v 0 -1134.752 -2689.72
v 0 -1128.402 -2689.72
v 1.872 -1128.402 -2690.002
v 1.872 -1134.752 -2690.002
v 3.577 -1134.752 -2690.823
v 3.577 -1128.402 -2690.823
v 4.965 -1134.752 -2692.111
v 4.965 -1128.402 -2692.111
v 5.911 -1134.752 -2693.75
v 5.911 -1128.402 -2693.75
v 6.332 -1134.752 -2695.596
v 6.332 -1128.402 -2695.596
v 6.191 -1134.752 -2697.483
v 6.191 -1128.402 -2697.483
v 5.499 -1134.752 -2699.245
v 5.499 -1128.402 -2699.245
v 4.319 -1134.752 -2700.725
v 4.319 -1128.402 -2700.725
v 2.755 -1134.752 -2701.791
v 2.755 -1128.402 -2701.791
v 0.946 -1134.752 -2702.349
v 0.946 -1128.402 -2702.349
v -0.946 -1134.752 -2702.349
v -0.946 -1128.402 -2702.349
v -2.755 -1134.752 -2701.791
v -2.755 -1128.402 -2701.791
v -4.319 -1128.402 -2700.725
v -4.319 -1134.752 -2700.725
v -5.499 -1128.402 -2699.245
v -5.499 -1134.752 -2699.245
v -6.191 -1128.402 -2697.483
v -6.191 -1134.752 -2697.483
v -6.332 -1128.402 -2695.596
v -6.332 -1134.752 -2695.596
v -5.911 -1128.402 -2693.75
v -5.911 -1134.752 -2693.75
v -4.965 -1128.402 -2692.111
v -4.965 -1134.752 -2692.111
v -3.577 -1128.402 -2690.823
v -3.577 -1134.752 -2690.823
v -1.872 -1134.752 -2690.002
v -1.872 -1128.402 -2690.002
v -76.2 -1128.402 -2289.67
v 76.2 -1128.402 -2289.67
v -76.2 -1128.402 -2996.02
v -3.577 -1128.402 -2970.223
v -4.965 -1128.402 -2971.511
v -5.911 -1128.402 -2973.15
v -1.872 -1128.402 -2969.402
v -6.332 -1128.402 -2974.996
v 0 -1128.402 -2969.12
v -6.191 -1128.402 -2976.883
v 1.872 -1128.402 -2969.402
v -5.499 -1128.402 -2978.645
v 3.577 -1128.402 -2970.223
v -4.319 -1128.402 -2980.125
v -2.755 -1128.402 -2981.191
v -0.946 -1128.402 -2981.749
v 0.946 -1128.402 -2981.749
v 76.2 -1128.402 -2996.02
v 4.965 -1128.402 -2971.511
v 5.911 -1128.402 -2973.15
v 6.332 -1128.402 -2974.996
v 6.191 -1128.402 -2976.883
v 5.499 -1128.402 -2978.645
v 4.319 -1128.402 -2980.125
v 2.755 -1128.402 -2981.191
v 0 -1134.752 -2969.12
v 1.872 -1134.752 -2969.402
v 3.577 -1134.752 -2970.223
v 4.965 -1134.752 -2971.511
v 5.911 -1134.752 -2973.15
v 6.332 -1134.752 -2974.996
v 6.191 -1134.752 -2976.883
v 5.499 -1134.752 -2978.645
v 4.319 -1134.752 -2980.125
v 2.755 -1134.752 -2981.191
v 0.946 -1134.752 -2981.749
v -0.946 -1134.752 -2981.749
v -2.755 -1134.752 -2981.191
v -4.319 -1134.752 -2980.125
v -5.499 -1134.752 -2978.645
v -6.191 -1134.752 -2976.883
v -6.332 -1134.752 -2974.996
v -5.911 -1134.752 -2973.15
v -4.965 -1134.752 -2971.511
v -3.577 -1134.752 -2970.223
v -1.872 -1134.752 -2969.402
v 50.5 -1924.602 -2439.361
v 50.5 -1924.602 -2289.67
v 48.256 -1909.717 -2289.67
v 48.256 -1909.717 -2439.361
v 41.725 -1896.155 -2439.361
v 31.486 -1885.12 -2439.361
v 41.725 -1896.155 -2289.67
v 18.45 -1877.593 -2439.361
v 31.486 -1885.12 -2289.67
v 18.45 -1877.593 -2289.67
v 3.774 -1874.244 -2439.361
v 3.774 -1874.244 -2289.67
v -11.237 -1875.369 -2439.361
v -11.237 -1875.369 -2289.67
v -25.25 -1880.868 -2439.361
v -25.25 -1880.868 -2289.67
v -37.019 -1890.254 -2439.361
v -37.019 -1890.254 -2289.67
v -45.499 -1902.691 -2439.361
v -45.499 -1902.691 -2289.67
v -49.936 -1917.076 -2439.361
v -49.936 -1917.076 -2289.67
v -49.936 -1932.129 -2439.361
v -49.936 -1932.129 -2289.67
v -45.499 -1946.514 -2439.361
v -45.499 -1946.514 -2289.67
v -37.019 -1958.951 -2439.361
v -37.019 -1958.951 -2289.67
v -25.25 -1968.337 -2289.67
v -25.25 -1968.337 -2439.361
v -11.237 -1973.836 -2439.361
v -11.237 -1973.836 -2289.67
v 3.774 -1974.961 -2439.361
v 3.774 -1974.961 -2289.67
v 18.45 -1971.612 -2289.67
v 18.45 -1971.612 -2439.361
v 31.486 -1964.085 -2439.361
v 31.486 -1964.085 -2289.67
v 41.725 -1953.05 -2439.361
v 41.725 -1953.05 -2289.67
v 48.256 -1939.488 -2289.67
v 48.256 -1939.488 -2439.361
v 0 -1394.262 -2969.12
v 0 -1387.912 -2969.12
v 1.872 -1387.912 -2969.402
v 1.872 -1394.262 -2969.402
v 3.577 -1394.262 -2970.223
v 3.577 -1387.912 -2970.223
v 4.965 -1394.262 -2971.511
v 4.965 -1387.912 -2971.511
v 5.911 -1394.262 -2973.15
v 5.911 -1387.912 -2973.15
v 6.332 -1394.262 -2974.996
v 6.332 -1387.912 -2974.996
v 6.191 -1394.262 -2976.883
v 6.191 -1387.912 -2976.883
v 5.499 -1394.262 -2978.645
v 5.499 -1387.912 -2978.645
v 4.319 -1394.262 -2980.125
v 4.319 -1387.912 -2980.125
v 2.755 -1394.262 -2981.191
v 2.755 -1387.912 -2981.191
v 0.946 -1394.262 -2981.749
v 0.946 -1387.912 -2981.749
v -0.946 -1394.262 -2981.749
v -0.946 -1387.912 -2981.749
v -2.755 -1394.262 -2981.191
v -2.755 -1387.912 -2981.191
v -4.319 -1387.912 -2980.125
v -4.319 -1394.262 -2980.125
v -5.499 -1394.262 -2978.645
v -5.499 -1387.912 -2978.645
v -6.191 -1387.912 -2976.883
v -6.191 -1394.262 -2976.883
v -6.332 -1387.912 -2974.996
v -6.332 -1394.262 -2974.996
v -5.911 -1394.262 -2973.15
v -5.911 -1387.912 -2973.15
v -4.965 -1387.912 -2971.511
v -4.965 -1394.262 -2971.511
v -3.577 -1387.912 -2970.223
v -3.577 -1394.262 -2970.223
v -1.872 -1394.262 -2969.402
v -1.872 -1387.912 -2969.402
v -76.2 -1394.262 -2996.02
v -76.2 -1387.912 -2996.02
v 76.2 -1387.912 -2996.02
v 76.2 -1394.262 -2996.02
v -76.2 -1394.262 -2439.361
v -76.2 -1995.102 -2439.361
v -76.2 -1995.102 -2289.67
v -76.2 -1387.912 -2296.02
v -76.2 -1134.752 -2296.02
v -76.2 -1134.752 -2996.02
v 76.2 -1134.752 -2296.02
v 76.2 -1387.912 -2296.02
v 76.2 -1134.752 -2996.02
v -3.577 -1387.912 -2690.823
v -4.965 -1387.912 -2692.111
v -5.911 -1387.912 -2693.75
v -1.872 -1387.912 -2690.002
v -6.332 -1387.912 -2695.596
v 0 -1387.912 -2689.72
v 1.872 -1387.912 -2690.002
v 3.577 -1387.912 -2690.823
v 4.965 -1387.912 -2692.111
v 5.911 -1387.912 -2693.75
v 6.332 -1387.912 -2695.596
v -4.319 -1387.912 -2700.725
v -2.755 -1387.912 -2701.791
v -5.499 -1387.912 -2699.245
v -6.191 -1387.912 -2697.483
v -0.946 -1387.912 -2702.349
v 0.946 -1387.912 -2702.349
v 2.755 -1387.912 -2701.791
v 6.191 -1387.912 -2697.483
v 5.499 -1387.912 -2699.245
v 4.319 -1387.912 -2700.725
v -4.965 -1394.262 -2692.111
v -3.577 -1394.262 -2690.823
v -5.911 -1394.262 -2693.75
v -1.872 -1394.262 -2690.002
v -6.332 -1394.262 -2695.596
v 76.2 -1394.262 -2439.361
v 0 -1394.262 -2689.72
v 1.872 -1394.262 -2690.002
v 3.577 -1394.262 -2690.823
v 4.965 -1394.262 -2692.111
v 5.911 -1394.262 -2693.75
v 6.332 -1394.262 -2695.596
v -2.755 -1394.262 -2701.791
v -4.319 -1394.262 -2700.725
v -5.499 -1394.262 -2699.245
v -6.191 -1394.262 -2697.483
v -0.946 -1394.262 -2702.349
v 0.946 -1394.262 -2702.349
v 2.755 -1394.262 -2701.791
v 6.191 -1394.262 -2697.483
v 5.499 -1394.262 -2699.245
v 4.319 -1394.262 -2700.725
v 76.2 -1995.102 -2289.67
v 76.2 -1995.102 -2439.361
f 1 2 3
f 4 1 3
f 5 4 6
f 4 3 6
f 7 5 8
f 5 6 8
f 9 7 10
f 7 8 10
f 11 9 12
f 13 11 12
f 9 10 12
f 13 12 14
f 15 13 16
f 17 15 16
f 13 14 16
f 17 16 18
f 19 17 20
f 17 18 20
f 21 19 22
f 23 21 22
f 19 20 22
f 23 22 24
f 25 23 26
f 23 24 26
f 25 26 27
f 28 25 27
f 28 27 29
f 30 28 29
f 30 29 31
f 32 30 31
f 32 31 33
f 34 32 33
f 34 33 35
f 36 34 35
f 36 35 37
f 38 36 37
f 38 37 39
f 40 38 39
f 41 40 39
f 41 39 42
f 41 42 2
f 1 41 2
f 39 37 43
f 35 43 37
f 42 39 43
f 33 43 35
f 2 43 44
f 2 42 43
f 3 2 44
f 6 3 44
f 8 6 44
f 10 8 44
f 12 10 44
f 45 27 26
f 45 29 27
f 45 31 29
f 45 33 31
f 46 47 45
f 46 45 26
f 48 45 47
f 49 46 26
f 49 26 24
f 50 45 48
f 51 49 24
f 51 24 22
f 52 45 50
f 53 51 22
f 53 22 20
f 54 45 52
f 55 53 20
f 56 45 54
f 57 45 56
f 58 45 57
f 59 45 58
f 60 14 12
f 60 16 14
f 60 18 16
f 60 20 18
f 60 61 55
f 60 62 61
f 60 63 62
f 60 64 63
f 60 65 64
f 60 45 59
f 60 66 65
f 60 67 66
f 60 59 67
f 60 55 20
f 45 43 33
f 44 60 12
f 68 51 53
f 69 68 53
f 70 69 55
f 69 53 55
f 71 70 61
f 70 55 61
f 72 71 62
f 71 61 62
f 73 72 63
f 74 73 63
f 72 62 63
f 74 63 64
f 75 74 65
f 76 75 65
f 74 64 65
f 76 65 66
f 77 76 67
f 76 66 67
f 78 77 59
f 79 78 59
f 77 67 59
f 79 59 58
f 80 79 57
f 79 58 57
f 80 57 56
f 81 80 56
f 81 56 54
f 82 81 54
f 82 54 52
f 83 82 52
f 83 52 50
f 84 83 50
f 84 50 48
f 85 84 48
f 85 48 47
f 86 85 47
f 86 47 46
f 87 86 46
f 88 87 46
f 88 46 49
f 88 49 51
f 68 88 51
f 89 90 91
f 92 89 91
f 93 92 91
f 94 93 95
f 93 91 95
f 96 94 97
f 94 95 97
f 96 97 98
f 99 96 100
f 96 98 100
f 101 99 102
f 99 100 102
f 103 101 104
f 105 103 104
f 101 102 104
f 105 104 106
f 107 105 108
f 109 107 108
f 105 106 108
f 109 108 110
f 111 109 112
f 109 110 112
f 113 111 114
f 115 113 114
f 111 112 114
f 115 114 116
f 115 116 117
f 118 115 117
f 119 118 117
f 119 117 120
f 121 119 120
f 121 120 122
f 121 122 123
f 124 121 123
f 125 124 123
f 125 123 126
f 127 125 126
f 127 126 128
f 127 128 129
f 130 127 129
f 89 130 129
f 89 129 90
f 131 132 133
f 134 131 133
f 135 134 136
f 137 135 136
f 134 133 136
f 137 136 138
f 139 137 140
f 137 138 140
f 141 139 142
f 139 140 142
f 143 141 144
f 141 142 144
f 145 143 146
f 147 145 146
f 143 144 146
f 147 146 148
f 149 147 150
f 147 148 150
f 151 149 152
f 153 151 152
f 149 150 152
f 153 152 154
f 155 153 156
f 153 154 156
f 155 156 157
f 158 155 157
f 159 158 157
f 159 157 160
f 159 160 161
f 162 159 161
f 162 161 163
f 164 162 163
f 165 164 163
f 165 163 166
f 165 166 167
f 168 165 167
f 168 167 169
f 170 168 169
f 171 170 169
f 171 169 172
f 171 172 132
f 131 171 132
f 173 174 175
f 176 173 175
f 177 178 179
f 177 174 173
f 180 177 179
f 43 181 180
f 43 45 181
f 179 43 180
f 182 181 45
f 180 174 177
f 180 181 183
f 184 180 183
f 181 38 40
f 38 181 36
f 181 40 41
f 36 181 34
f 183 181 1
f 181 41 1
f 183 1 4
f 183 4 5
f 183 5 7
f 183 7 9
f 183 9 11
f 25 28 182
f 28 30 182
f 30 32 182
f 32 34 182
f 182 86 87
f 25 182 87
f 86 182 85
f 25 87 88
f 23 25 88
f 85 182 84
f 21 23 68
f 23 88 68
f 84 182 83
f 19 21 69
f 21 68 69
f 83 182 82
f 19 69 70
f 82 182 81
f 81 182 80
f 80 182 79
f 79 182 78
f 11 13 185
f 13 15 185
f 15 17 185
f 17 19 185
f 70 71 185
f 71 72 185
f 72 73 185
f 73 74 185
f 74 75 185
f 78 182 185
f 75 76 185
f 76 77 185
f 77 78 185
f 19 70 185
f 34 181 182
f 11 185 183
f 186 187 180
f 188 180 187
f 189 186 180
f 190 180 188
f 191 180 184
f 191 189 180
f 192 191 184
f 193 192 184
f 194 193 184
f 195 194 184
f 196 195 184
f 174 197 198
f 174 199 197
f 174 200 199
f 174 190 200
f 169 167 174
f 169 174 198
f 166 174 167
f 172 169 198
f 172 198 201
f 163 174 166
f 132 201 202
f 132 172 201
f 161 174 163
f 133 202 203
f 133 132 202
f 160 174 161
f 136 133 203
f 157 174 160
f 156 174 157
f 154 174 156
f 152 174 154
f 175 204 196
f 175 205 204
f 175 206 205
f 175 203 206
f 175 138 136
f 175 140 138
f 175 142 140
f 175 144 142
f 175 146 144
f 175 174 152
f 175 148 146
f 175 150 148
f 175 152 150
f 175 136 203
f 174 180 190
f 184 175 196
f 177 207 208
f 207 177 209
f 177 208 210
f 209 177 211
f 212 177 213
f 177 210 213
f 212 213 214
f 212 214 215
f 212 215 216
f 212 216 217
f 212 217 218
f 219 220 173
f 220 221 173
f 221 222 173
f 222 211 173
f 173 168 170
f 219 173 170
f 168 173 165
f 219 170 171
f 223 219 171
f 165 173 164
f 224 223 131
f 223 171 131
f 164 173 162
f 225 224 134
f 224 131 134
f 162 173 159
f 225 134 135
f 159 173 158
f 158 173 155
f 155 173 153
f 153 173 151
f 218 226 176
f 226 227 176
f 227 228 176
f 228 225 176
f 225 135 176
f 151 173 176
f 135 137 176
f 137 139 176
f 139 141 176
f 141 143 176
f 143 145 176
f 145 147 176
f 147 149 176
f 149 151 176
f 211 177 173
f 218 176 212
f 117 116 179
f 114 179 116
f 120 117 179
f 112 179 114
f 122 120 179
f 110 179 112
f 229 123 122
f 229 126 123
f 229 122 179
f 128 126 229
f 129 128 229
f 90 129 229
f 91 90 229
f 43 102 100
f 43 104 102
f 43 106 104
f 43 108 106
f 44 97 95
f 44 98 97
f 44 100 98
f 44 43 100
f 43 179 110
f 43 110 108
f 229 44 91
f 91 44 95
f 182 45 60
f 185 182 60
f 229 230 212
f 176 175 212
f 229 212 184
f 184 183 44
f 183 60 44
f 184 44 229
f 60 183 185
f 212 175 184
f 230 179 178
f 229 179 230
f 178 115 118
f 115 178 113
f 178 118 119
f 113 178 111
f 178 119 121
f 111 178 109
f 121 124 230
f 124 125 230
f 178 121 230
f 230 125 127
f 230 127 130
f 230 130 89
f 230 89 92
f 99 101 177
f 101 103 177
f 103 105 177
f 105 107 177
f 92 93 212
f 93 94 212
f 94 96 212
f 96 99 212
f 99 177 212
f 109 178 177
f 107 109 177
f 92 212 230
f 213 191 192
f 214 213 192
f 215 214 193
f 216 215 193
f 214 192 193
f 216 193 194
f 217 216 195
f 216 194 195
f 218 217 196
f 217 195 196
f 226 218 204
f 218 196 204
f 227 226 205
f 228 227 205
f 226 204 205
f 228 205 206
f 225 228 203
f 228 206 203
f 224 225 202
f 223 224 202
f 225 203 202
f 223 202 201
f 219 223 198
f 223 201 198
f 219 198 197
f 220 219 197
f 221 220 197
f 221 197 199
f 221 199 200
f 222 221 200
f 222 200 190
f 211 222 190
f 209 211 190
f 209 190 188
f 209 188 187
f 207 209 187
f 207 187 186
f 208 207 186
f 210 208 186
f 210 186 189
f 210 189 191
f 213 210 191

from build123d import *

# Parameters (mm, degrees)
SKETCH1_W           = 3870.96
SKETCH1_H           = 22014.18
BOSS_EXTRUDE1_DEPTH = 161.29
SKETCH2_W           = 3870.96
SKETCH2_H           = 17780
BOSS_EXTRUDE2_DEPTH = 161.29
SKETCH3_W           = 3870.96
SKETCH3_H           = 17780
BOSS_EXTRUDE3_DEPTH = 161.29
SKETCH4_W           = 3870.96
SKETCH4_H           = 3709.67
BOSS_EXTRUDE4_DEPTH = 15261.336
SKETCH5_R           = 161.29
CUT_EXTRUDE1_DEPTH  = 12848.844
SKETCH7_R           = 1282.7
CUT_EXTRUDE2_DEPTH  = 21138.454907405
SCALE1_SCALE        = 0.039370079


with BuildPart() as part:
    # Sketch1 → Boss-Extrude1 (new body)
    with BuildSketch(Plane.XY):
        Rectangle(SKETCH1_W, SKETCH1_H)
    extrude(amount=BOSS_EXTRUDE1_DEPTH)

    # Sketch2 → Boss-Extrude2 (add)
    with BuildSketch(Plane(origin=(0, 11007.09, 0), x_dir=(1, 0, 0), z_dir=(0, 1, 0))):
        with Locations((0, 8890)):
            Rectangle(SKETCH2_W, SKETCH2_H)
    extrude(amount=-BOSS_EXTRUDE2_DEPTH)

    # Sketch3 → Boss-Extrude3 (add)
    with BuildSketch(Plane(origin=(0, 4415.536, 0), x_dir=(1, 0, 0), z_dir=(0, 1, 0))):
        with Locations((0, 8890)):
            Rectangle(SKETCH3_W, SKETCH3_H)
    extrude(amount=-BOSS_EXTRUDE3_DEPTH)

    # Sketch4 → Boss-Extrude4 (add)
    with BuildSketch(Plane.XZ.offset(-4254.246)):
        with Locations((0, -1786.014661267)):
            Rectangle(SKETCH4_W, SKETCH4_H)
    extrude(amount=BOSS_EXTRUDE4_DEPTH)

    # Sketch5 → Cut-Extrude1 (cut)
    with BuildSketch(Plane(origin=(0, 11007.09, 0), x_dir=(1, 0, 0), z_dir=(0, 1, 0))):
        with Locations(Location((0, 17258.03, 0), (0, 0, 270))):
            Circle(SKETCH5_R)
        with Locations(Location((0, 10161.27, 0), (0, 0, 270))):
            Circle(SKETCH5_R)
    extrude(amount=-CUT_EXTRUDE1_DEPTH, mode=Mode.SUBTRACT)

    # Sketch7 → Cut-Extrude2 (cut, through all)
    with BuildSketch(Plane.XY.offset(161.29)):
        with Locations((0, -9216.39)):
            Circle(SKETCH7_R)
    extrude(amount=-CUT_EXTRUDE2_DEPTH, mode=Mode.SUBTRACT)


with BuildPart() as part_1:
    # Scale1: scaled about (0, -1625.758634815, -2390.119236931)
    add(part.part.scale(SCALE1_SCALE).moved(Location((0, -1561.75238935, -2296.020054375))))


solid = part_1.part
